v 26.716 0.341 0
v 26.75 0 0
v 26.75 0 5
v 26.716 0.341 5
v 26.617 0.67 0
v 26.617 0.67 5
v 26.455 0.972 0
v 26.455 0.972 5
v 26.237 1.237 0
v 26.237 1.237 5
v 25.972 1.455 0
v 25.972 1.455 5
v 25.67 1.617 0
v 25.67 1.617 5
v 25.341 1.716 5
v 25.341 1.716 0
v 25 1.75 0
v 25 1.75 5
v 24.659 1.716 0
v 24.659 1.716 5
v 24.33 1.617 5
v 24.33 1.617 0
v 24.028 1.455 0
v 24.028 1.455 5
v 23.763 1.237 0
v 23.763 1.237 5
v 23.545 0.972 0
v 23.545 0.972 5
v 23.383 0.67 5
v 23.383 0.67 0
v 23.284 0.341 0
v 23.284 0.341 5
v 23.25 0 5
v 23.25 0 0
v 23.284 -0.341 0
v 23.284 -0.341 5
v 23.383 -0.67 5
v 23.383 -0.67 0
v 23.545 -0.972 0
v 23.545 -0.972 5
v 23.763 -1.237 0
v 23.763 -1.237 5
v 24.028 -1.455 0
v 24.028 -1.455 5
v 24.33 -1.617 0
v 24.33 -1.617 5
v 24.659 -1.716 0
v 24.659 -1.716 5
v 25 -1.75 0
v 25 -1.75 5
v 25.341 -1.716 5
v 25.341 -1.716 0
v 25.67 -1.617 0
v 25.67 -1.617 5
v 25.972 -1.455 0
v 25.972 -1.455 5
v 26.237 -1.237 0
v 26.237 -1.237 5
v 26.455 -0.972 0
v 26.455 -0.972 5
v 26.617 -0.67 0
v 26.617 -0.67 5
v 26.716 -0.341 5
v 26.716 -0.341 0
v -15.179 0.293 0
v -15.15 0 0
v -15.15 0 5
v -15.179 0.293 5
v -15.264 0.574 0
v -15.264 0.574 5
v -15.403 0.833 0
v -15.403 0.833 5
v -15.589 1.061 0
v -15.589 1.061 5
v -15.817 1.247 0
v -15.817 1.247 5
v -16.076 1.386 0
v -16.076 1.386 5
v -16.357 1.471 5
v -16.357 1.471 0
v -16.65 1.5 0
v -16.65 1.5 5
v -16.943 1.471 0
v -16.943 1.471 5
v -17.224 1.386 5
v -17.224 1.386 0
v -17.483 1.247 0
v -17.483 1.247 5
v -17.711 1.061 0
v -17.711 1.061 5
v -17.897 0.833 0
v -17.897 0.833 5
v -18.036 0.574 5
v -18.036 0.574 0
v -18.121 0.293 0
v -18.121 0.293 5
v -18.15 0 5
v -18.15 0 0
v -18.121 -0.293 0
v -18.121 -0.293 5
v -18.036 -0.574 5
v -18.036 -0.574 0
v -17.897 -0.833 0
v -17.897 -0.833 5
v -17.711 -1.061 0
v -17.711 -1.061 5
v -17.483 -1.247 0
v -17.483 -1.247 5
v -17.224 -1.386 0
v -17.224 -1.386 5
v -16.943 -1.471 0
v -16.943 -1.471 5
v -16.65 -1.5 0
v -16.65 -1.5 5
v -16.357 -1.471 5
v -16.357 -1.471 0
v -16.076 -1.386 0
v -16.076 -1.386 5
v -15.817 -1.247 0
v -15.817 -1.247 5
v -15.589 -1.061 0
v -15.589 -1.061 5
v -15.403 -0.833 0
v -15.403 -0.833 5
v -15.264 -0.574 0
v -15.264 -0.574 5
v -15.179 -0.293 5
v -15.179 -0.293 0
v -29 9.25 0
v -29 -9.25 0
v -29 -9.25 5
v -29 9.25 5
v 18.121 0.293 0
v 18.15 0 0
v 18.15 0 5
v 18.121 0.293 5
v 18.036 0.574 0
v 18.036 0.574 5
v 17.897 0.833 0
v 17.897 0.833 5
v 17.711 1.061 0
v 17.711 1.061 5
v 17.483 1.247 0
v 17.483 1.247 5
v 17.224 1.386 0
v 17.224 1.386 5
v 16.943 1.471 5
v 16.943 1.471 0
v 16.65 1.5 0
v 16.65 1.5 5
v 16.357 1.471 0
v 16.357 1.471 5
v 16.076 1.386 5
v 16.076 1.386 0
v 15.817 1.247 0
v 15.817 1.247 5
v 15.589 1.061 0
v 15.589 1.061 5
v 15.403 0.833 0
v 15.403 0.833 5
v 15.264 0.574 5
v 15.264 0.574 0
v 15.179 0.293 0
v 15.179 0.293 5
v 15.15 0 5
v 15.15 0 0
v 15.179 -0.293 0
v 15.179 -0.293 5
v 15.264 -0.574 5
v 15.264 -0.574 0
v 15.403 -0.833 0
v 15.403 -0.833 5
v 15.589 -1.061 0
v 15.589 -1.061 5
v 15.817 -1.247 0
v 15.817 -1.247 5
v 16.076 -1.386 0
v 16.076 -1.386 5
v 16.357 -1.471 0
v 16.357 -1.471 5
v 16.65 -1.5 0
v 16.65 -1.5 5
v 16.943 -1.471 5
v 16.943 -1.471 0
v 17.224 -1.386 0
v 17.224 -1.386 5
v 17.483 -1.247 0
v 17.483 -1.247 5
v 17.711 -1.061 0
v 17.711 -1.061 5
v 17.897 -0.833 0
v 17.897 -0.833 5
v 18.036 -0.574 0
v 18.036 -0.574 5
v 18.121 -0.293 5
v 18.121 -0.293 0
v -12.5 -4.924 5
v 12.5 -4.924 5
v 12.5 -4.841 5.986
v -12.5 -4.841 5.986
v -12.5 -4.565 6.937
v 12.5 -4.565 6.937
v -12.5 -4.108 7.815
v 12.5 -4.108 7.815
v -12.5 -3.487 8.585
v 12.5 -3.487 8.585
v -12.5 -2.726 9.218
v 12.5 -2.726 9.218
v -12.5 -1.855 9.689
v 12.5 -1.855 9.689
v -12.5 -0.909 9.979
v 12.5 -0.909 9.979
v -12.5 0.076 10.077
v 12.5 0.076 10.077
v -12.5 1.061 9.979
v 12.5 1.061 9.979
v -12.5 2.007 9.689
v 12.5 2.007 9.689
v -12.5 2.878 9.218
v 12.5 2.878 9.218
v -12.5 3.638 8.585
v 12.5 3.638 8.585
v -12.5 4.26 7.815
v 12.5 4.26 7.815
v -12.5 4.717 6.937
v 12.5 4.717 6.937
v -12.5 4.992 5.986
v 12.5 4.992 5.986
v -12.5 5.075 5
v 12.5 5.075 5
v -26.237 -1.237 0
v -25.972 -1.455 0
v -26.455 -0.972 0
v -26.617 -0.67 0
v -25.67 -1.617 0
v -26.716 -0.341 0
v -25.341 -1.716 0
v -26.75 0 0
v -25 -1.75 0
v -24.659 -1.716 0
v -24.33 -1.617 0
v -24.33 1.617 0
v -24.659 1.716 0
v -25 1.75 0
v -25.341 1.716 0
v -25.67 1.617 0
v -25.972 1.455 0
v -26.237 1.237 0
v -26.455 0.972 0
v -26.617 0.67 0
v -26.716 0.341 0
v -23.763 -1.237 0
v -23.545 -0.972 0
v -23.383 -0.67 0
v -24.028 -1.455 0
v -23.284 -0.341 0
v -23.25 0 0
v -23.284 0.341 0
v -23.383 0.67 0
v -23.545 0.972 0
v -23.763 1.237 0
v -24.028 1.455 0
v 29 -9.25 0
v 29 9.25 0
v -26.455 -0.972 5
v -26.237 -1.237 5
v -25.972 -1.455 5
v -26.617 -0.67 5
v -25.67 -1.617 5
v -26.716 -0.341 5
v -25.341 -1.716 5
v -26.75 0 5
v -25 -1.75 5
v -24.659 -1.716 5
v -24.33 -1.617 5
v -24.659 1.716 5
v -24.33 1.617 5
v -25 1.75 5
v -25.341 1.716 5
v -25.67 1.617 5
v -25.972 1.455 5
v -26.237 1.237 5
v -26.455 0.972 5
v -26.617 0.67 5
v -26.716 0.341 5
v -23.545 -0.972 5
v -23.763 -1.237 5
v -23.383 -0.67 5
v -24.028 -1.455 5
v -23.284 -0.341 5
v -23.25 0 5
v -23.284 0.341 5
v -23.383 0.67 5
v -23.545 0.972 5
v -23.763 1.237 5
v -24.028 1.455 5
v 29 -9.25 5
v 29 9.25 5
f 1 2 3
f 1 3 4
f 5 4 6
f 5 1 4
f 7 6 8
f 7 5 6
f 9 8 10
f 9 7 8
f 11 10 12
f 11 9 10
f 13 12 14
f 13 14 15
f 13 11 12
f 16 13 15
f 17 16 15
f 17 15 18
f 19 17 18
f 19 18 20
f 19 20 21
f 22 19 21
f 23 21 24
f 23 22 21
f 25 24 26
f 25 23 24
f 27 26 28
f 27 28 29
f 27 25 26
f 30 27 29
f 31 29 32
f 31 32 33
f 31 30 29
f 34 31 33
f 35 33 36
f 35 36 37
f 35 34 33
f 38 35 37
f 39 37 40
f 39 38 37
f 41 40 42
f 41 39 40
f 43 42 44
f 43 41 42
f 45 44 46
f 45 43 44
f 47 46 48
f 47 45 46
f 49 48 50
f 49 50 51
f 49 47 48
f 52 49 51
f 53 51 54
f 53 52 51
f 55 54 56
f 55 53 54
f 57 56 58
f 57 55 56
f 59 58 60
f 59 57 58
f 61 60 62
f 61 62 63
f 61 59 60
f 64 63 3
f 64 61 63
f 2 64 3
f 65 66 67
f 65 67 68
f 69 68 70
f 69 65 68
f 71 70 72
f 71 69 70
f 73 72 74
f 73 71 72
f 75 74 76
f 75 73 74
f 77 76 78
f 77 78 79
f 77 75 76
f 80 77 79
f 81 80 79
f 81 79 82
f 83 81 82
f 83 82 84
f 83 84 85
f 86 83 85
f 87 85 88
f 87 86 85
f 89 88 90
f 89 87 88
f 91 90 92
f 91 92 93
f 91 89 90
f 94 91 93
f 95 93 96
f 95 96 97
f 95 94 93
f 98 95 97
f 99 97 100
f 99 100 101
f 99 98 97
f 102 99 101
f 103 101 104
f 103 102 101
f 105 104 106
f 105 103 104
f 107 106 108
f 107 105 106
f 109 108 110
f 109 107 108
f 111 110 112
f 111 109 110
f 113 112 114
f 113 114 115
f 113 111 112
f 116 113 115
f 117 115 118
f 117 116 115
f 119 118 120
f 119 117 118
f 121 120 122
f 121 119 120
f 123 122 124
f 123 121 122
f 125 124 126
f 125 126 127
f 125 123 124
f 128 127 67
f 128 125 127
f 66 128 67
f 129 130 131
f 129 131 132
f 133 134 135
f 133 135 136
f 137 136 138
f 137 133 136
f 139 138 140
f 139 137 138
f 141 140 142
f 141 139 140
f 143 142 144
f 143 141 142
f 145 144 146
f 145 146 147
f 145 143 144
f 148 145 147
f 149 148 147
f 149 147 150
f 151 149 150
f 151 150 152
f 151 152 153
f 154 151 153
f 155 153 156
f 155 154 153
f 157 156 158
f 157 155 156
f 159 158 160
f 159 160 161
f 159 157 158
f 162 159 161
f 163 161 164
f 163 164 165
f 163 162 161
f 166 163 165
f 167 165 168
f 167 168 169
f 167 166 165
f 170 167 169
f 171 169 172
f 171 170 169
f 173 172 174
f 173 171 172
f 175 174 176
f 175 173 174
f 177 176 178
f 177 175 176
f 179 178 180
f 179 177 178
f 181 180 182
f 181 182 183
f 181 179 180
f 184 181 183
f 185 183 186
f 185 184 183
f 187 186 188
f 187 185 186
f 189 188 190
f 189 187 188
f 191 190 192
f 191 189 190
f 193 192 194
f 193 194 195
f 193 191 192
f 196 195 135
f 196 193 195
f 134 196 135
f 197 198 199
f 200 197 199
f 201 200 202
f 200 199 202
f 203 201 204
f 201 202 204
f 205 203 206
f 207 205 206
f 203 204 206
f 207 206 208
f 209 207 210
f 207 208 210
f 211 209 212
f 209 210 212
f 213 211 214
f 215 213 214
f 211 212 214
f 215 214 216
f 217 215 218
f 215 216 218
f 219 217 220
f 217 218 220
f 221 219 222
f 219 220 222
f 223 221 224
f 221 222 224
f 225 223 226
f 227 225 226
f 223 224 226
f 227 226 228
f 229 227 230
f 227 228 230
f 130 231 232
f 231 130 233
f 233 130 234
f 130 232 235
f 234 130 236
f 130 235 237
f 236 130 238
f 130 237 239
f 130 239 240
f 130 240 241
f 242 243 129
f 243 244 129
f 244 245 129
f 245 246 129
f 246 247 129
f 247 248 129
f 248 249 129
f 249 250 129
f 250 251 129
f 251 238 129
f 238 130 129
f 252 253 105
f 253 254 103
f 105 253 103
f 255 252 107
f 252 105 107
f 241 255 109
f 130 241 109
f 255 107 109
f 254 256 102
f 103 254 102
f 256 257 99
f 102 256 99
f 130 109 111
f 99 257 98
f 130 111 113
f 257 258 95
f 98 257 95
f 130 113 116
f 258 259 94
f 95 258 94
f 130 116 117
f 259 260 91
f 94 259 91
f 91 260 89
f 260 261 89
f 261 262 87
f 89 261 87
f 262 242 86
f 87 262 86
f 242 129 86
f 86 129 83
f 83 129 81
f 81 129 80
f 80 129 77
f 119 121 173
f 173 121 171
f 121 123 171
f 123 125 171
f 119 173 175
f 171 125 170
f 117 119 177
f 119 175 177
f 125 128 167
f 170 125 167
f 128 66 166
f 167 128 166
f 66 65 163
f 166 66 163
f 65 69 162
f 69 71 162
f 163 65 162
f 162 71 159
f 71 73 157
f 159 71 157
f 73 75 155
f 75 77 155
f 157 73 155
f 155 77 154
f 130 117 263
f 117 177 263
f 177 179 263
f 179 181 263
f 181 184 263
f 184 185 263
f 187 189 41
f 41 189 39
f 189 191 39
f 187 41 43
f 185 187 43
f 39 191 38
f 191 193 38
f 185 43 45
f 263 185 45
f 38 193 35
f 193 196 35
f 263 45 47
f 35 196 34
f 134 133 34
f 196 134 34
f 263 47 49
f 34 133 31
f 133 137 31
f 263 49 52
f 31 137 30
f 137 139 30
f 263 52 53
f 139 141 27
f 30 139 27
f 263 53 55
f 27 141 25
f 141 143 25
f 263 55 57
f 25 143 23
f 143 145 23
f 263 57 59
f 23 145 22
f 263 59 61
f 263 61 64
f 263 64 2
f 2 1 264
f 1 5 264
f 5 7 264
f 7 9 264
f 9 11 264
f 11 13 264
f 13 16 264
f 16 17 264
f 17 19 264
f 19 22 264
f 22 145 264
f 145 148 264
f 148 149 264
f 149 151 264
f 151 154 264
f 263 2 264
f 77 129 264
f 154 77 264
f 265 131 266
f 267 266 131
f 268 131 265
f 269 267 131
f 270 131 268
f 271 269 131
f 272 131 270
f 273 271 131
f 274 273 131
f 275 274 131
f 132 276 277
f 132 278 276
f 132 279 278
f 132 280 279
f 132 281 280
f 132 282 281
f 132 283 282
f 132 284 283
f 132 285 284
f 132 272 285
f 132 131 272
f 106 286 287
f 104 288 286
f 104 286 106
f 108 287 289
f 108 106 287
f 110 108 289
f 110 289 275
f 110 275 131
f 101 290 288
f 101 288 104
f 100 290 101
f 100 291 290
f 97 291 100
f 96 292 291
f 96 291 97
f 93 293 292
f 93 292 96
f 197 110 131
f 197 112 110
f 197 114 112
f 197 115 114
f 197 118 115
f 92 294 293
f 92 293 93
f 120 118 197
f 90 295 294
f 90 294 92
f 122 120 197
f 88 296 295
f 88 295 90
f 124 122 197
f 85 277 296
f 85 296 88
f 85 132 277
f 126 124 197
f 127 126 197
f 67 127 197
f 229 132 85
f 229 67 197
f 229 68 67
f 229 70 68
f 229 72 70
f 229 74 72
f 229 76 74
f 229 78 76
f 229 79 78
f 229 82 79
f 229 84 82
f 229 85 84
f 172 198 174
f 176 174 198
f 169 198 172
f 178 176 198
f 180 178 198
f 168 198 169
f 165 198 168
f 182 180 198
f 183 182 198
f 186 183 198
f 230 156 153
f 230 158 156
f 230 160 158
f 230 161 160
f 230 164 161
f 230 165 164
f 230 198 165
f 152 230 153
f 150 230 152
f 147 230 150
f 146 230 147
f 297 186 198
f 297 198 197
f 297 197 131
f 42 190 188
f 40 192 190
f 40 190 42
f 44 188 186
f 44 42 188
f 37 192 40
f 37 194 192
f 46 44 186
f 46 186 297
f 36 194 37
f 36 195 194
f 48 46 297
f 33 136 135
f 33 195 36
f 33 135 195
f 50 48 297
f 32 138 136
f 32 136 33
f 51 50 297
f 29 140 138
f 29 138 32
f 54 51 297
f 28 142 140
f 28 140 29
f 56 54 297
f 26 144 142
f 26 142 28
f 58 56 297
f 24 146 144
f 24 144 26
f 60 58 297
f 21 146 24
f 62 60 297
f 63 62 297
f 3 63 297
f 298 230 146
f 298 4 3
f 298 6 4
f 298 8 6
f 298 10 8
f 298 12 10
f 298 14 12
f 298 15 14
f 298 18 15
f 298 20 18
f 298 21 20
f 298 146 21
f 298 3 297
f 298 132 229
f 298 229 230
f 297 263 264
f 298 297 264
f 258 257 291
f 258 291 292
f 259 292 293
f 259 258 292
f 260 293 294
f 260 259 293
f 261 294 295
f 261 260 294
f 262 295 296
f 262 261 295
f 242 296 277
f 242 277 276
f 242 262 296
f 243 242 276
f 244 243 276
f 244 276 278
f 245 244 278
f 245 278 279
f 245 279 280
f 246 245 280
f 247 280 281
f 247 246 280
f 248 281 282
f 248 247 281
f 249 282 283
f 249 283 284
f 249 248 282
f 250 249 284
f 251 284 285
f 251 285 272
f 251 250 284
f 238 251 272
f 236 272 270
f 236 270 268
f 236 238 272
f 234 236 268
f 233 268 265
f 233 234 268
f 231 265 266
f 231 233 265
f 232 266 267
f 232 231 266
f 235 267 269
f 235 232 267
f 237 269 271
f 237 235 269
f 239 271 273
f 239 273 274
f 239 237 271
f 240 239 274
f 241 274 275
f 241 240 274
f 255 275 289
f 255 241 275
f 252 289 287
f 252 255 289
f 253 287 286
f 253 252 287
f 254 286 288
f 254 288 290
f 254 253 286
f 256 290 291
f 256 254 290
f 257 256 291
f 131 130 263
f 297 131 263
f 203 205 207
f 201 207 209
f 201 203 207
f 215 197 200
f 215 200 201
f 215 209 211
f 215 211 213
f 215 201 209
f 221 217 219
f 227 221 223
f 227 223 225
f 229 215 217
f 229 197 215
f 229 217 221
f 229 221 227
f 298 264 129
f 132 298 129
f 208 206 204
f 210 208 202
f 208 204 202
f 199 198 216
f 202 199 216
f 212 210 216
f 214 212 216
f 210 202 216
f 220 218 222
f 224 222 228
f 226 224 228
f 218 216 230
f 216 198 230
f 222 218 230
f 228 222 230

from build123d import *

# Parameters (mm, degrees)
F0_W     = 38
F0_H     = 18.5
F0_R     = 1.5
F0_W_2   = 10
F0_R_2   = 1.75
F1_DEPTH = 5
F2_W     = 25
F2_H     = 18.5
F3_DEPTH = 9.25
F5_DEPTH = 25


with BuildPart() as f1:
    # F0 (on Top) → F1 (new body)
    with BuildSketch(Plane.XY):
        Rectangle(F0_W, F0_H)
        with Locations((-16.65, 0)):
            Circle(F0_R, mode=Mode.SUBTRACT)
        with Locations((16.65, 0)):
            Circle(F0_R, mode=Mode.SUBTRACT)
        with Locations((24, 0)):
            Rectangle(F0_W_2, F0_H)
        with Locations((25, 0)):
            Circle(F0_R_2, mode=Mode.SUBTRACT)
        with Locations((-24, 0)):
            Rectangle(F0_W_2, F0_H)
        with Locations((-25, 0)):
            Circle(F0_R_2, mode=Mode.SUBTRACT)
    extrude(amount=F1_DEPTH)

    # F2 (on face) → F3 (join)
    with BuildSketch(Plane.XY.offset(5)):
        Rectangle(F2_W, F2_H)
    extrude(amount=F3_DEPTH)

    # F4 (on face) → F5 (cut)
    with BuildSketch(Plane.YZ.offset(12.5)):
        with BuildLine():
            ThreePointArc((-4.923553, 5), (0.07586, 10.076588), (5.075274, 5))
            Line((5.075274, 5), (9.25, 5))
            Line((9.25, 5), (9.25, 14.25))
            Line((9.25, 14.25), (-9.25, 14.25))
            Line((-9.25, 14.25), (-9.25, 5))
            Line((-9.25, 5), (-4.923553, 5))
        make_face()
    extrude(amount=-F5_DEPTH, mode=Mode.SUBTRACT)


solid = f1.part
